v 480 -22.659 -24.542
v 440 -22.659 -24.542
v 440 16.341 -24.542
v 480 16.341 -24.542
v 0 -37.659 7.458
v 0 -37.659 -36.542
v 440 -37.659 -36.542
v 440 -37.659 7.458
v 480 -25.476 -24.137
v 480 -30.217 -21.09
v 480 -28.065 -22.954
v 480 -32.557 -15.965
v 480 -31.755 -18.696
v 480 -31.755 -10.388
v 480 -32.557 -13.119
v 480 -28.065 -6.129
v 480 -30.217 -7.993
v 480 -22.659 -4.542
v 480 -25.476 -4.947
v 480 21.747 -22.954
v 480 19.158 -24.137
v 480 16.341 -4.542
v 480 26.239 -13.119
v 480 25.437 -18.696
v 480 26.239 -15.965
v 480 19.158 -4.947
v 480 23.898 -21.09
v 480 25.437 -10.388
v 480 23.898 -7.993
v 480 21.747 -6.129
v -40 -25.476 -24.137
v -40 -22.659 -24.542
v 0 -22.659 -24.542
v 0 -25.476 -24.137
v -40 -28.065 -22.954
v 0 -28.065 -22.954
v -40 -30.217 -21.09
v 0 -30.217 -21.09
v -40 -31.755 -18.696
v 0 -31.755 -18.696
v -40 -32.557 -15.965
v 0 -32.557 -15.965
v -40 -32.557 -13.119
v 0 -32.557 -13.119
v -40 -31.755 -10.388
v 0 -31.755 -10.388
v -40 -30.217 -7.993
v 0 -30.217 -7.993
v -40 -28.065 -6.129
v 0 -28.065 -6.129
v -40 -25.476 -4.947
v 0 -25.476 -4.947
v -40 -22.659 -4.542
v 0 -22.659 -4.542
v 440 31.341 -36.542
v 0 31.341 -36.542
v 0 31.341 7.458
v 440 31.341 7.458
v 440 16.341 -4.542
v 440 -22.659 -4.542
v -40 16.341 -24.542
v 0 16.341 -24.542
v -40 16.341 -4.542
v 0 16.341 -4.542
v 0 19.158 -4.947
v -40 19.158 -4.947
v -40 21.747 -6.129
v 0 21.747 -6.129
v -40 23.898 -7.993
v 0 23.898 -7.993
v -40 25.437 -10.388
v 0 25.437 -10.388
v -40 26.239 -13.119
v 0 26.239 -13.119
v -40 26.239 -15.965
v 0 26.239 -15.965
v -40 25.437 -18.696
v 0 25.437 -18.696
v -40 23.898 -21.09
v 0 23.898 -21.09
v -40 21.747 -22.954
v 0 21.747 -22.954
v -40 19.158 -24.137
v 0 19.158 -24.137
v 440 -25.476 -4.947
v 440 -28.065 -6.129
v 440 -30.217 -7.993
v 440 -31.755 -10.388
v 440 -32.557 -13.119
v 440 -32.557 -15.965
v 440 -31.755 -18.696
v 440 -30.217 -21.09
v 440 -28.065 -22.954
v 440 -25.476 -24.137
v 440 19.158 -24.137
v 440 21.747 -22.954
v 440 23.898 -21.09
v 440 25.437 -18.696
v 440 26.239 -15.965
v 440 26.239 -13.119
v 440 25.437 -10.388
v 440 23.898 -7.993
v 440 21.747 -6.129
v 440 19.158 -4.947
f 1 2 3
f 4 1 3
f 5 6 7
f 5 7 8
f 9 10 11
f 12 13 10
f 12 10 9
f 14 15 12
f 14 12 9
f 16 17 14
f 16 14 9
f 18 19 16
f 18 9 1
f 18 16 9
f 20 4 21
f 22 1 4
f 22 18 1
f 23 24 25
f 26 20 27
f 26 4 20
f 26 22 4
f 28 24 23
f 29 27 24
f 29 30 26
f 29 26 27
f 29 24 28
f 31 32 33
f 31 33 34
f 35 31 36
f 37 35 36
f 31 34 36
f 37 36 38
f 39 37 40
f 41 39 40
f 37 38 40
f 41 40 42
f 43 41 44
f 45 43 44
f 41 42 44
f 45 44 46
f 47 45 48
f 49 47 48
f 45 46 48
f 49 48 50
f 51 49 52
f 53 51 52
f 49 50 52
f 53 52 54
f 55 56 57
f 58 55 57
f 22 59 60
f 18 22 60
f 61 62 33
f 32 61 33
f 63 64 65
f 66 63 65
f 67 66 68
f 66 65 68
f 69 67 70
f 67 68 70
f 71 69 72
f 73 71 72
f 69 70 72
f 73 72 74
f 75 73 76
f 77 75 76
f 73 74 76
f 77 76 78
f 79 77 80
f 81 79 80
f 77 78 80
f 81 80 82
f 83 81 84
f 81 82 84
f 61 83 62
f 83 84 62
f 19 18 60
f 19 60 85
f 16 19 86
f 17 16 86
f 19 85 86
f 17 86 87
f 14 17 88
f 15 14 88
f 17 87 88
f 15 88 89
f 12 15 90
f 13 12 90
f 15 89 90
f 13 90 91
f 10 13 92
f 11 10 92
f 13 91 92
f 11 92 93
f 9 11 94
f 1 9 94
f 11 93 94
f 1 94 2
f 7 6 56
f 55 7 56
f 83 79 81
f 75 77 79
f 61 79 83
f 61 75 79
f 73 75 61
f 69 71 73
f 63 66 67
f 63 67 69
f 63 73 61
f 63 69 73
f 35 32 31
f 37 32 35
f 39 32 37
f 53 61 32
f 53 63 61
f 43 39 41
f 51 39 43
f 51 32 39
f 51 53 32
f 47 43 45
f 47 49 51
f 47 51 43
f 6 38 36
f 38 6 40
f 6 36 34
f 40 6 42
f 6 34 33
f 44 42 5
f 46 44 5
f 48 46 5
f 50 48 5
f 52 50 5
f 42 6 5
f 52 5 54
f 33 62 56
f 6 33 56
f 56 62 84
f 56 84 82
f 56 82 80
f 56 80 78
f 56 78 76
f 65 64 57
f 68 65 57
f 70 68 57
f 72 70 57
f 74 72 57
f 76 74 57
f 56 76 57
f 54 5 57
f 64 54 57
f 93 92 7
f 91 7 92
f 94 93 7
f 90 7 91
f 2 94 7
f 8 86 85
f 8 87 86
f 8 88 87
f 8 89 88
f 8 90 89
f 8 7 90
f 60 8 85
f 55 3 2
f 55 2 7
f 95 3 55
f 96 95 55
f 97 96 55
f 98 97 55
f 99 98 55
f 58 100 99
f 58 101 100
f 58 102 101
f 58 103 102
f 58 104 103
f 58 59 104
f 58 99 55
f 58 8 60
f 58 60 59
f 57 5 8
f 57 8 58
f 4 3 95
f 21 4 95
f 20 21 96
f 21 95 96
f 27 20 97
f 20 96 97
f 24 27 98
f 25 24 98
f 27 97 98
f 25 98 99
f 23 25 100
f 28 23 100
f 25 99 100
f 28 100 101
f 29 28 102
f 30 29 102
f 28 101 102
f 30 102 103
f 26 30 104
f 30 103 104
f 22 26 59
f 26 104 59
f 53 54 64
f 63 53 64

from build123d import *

# Parameters (mm, degrees)
F0_W     = 69
F0_H     = 44
F1_DEPTH = 440
F3_DEPTH = 40
F5_DEPTH = 40


with BuildPart() as f1:
    # F0 (on Right) → F1 (new body)
    with BuildSketch(Plane.YZ):
        with Locations((-3.159018, -14.54166)):
            Rectangle(F0_W, F0_H)
    extrude(amount=F1_DEPTH)

    # F2 (on face) → F3 (join)
    with BuildSketch(Plane(origin=(0, 0, 0), x_dir=(0, -1, 0), z_dir=(-1, 0, 0))):
        with BuildLine():
            ThreePointArc((-16.340982, -4.54166), (-26.340982, -14.54166), (-16.340982, -24.54166))
            Line((-16.340982, -24.54166), (22.659018, -24.54166))
            ThreePointArc((22.659018, -24.54166), (32.659018, -14.54166), (22.659018, -4.54166))
            Line((22.659018, -4.54166), (-16.340982, -4.54166))
        make_face()
    extrude(amount=F3_DEPTH)

    # F4 (on face) → F5 (join)
    with BuildSketch(Plane.YZ.offset(440)):
        with BuildLine():
            ThreePointArc((16.340982, -24.54166), (26.340982, -14.54166), (16.340982, -4.54166))
            Line((16.340982, -4.54166), (-22.659018, -4.54166))
            ThreePointArc((-22.659018, -4.54166), (-32.659018, -14.54166), (-22.659018, -24.54166))
            Line((-22.659018, -24.54166), (16.340982, -24.54166))
        make_face()
    extrude(amount=F5_DEPTH)


solid = f1.part
